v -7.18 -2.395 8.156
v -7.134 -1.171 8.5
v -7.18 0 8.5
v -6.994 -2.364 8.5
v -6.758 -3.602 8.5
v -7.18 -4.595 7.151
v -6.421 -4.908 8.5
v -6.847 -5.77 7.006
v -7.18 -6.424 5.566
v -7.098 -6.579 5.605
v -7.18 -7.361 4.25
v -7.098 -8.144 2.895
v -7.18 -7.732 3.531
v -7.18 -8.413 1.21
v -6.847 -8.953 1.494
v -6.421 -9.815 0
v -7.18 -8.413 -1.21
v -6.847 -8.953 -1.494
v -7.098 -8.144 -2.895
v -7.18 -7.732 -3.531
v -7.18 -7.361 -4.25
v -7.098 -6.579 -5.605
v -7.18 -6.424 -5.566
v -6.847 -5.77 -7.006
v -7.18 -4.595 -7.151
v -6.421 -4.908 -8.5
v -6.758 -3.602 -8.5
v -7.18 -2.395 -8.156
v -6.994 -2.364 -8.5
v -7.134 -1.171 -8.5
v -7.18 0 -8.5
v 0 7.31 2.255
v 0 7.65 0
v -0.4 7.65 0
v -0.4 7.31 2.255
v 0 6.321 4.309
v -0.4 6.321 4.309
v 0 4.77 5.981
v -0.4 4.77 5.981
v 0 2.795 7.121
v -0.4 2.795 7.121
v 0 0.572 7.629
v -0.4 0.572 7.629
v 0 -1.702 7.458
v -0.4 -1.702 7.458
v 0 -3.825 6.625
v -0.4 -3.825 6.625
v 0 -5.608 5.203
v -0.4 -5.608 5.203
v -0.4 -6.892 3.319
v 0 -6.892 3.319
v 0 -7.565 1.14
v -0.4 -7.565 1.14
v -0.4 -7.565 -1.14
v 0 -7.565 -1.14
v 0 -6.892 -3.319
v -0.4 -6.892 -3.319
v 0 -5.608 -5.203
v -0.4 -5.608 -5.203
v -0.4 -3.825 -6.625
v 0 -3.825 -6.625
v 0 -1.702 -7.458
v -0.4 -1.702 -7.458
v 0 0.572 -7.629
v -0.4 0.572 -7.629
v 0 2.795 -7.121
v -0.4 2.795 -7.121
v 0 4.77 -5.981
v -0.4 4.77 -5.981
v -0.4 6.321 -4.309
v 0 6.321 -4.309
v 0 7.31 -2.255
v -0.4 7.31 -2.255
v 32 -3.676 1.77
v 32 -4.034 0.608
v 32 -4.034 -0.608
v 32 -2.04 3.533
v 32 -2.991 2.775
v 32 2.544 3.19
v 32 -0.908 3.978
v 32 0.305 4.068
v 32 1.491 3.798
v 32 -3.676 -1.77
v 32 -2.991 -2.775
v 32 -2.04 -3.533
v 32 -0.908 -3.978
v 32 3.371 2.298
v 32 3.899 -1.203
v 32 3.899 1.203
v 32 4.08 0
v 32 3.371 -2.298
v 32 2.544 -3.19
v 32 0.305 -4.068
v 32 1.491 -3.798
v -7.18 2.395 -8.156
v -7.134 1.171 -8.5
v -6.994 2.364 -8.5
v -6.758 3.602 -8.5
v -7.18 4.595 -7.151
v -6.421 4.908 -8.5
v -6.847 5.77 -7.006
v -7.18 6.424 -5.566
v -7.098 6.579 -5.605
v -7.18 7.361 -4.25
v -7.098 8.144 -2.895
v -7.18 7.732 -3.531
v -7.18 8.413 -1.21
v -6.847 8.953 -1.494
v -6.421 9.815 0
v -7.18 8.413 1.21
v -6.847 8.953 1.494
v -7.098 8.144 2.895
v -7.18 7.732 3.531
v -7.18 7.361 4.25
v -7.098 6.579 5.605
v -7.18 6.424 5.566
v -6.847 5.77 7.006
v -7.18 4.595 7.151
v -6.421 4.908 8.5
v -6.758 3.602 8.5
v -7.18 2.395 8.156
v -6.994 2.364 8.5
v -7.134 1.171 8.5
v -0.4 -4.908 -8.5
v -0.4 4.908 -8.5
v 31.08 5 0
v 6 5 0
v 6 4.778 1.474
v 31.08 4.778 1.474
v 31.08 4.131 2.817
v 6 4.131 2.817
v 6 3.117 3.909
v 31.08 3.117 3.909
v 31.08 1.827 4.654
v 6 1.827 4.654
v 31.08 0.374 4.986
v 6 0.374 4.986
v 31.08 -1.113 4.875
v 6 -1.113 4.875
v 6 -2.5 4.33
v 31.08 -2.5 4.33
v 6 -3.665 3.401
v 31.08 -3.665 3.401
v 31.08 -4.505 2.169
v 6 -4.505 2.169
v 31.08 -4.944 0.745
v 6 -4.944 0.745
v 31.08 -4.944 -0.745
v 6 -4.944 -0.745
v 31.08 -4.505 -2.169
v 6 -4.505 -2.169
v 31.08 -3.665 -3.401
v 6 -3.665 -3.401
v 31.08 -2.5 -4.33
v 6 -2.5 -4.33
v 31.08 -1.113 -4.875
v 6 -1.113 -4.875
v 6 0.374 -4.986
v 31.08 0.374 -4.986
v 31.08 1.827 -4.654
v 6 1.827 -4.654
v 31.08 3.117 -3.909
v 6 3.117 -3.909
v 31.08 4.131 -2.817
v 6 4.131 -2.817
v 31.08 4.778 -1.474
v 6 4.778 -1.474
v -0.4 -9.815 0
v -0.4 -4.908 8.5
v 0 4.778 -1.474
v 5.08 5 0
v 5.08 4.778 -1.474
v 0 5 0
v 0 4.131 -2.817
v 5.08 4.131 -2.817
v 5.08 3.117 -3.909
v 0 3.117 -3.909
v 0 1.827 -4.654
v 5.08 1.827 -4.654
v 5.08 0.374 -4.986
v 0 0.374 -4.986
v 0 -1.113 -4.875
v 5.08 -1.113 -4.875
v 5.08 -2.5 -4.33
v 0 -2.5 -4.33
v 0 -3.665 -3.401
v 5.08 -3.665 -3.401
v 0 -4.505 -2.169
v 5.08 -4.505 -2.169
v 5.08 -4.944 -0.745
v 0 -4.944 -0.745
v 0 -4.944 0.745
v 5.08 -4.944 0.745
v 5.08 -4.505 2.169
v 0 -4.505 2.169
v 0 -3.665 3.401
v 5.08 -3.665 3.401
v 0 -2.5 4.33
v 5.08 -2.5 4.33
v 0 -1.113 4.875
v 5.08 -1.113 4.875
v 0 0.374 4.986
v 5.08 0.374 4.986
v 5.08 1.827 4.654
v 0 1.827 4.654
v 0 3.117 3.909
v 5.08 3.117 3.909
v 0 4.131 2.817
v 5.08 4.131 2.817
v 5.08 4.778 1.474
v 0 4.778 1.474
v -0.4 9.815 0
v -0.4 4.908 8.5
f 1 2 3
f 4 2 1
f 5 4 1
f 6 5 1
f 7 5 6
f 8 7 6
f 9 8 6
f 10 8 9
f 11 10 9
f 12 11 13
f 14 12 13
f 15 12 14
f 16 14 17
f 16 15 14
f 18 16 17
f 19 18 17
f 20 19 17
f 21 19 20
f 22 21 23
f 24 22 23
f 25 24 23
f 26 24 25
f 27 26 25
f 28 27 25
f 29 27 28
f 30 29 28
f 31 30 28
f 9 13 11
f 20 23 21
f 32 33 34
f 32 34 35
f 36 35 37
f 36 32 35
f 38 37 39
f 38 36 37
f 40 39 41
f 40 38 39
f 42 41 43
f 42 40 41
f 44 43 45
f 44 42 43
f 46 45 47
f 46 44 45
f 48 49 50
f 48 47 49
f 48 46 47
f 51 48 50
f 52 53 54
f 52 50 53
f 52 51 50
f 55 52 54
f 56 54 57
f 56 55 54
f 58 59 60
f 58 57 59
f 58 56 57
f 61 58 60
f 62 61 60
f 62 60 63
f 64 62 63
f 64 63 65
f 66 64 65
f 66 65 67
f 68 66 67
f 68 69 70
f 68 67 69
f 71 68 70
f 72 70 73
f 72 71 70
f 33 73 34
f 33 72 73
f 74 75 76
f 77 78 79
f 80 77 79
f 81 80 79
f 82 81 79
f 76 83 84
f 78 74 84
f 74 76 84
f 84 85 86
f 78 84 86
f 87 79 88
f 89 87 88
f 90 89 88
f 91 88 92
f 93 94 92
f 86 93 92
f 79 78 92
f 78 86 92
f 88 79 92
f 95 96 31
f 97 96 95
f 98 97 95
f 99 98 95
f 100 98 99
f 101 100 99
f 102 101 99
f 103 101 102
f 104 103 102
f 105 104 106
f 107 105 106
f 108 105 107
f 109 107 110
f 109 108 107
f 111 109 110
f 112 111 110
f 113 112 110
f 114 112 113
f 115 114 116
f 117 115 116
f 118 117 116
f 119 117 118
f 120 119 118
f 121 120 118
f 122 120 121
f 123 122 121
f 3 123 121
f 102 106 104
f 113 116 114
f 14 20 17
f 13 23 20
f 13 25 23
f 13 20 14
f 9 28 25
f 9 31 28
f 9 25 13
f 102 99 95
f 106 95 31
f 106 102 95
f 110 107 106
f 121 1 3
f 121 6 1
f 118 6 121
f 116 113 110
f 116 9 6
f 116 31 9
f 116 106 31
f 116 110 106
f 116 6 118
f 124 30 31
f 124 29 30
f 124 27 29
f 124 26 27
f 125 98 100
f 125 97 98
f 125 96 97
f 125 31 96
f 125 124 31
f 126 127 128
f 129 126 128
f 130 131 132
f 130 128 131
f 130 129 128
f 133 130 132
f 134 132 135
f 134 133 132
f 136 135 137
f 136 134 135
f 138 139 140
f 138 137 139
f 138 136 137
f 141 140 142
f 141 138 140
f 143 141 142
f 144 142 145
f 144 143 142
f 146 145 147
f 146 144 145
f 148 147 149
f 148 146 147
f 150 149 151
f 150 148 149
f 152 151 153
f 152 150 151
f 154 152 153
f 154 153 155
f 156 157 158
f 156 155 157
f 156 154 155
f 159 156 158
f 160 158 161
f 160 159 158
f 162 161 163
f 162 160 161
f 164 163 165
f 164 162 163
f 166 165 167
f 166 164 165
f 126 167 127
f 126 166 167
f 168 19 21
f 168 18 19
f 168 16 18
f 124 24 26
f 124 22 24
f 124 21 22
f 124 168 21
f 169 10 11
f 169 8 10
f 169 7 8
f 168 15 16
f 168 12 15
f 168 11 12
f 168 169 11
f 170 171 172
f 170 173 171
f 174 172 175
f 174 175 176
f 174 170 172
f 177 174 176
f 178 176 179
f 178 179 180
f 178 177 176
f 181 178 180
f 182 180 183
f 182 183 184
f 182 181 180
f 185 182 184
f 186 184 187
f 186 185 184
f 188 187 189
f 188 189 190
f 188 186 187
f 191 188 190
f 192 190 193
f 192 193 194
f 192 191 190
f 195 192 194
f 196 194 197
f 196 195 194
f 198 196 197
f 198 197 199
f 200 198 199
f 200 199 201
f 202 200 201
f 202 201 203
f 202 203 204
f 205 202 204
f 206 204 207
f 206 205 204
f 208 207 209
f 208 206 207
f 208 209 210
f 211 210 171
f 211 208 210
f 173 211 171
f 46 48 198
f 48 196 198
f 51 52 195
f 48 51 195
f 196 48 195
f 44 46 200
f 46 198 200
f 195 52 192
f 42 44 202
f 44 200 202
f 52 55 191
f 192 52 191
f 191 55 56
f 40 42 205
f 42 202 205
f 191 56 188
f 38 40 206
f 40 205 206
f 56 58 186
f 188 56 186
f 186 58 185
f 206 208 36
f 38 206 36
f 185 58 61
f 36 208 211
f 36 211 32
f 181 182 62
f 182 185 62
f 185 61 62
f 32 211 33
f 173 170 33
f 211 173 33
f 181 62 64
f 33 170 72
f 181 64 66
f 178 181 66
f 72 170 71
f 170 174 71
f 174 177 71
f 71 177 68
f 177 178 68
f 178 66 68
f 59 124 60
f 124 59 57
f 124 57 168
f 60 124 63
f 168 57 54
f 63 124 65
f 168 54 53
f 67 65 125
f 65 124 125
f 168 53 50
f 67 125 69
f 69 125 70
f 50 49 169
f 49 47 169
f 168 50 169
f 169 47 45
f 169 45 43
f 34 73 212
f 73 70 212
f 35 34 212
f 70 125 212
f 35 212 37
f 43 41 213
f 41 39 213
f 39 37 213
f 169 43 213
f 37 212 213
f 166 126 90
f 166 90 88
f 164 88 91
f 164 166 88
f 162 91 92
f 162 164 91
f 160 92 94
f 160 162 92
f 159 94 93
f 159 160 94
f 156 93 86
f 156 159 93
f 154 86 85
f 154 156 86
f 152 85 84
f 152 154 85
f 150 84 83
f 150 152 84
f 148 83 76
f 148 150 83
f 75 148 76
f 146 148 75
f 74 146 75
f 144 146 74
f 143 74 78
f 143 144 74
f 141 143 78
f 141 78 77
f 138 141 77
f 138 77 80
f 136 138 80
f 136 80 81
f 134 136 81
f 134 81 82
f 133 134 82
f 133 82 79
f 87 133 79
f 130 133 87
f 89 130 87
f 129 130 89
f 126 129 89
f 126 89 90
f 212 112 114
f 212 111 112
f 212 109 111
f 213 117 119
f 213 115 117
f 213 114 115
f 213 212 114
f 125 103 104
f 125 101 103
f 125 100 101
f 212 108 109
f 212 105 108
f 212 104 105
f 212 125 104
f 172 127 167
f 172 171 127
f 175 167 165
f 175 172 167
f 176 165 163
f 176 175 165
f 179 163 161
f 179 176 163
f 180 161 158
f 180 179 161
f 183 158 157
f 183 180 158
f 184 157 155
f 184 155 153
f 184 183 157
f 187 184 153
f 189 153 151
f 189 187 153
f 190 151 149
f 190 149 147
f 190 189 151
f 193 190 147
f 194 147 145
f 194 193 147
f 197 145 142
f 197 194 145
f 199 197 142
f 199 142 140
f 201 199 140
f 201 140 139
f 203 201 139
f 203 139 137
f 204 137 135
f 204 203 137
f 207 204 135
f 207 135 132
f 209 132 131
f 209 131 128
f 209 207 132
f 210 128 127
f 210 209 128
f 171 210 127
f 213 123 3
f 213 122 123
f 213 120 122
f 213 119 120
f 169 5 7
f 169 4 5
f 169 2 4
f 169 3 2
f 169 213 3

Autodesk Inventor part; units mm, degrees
ref_plane "YZ Plane" through (0, 0, 0) normal (1, 0, 0) x (0, 1, 0)
ref_plane "XZ Plane" through (0, 0, 0) normal (0, 1, 0) x (-1, 0, 0)
sketch "Sketch1" plane through (0, 0, 0) normal (0, 0, 1) x (1, 0, 0)
  line L0 (0, 7.65) -> (0, 5)
  line L1 (6, 5) -> (32, 5)
  line L2 (32, 5) -> (32, 0)
  line L3 (32, 0) -> (-0.4001, 0)
  line L4 (-6.8801, 0) -> (38.48, 0) projected
  line L5 (-0.4001, 0) -> (-0.4001, 7.65)
  line L6 (-0.4001, 7.65) -> (0, 7.65)
  line L7 (6, 5) -> (5.0797, 5)
  line L8 (5.0797, 5) -> (0, 5)
  line L9 (0, -1.53) -> (0, 9.18) projected
  dimension "d0" = 32
  dimension "d1" = 26
  dimension "d2" = 10
  dimension "d9" = 0.4001
  dimension "d10" = 15.3
  dimension "d13" = 0.9203
  dimension "d14" = 10
revolve "Body" add sketch "Sketch1" angle 360 about axis through (32, 0, 0) along (-1, 0, 0)
sketch "Sketch2" plane through (-0.4001, 0, 0) normal (-1, 0, 0) x (0, 0, 1)
  line L0 (0, 9.815) -> (8.5, 4.9075)
  line L1 (8.5, 4.9075) -> (8.5, -4.9075)
  line L2 (8.5, -4.9075) -> (0, -9.815)
  line L3 (0, -9.815) -> (-8.5, -4.9075)
  line L4 (-8.5, -4.9075) -> (-8.5, 4.9075)
  line L5 (-8.5, 4.9075) -> (0, 9.815)
  point P0 (0, 0)
  point P1 (0, 0)
  dimension "d11" = 17
extrude "Head" add sketch "Sketch2" along normal blind 6.78
sketch "Sketch4" plane through (0, 0, 0) normal (0, 0, 1) x (1, 0, 0)
  line L0 (-7.1801, 8.5) -> (-7.1801, 9.815)
  line L1 (-7.1801, 9.815) -> (-6.4209, 9.815)
  line L2 (-6.4209, 9.815) -> (-7.1801, 8.5)
  line L3 (-8.5361, 0) -> (0.9559, 0) projected
  line L4 (-0.4001, 9.815) -> (-7.1801, 9.815) projected
  line L5 (-7.1801, 4.9075) -> (-7.1801, 9.815) projected
  dimension "d5" = 30
  dimension "d19" = 17
revolve "Chamfer1" cut sketch "Sketch4" angle 360 about axis through (-10, 0, 0) along (1, 0, 0)
thread "Thread" size "M10x1.5" class "6g" standard "ISO Metric profile" length 26
chamfer "Chamfer2" distance 0.9202 distance2 0.9203 1 edges at (32, -5, 0) measured on face at (32, -0.2009, 0.1054)
ref_plane "Work Plane1" through (1.525, 0, 0) normal (0, 0, 1) x (1, 0, 0)
equation "\"d11\" = SW"
equation "\"d3\" = KOH - SD"
equation "\"d15\" = GEL"
equation "\"d6\" = -0.5 * SPD + 0.5 * GD"
equation "\"d0\" = NLG"
equation "\"d1\" = GEL"
equation "\"d2\" = GD"
equation "\"d10\" = SD2"
equation "\"d14\" = BDM"
equation "\"d5\" = ANG1"
equation "\"d19\" = SW0"
equation "\"NLG\" = 32"
equation "\"GD\" = NND"
equation "\"BDM\" = NND"
equation "\"KOH\" = 7.18"
equation "\"GEL\" = 26"
equation "\"SW\" = 17"
equation "\"SW0\" = 17"
equation "\"SPD\" = NND - 1.2269 * PTC"
equation "\"SD2\" = 0.9 * SW"
equation "\"SD\" = 0.4"
equation "\"ANG1\" = 30deg"
equation "\"GAL\" = 0.61345 * PTC"
equation "\"GUL\" = 0.61345 * PTC"
equation "\"RR\" = 0.6"
equation "\"GD1\" = THREADDIA - 1.2269 * PTC"
equation "\"SDH\" = 16.43"
equation "\"TOA\" = 30deg"
equation "\"PTC\" = 1.5"
equation "\"E0\" = 1.155 * SW"
equation "\"NND\" = 10"
equation "\"THREADDIA\" = 10"
properties part number "BS 3692 - M10 x 32" material "Steel, Mild"
